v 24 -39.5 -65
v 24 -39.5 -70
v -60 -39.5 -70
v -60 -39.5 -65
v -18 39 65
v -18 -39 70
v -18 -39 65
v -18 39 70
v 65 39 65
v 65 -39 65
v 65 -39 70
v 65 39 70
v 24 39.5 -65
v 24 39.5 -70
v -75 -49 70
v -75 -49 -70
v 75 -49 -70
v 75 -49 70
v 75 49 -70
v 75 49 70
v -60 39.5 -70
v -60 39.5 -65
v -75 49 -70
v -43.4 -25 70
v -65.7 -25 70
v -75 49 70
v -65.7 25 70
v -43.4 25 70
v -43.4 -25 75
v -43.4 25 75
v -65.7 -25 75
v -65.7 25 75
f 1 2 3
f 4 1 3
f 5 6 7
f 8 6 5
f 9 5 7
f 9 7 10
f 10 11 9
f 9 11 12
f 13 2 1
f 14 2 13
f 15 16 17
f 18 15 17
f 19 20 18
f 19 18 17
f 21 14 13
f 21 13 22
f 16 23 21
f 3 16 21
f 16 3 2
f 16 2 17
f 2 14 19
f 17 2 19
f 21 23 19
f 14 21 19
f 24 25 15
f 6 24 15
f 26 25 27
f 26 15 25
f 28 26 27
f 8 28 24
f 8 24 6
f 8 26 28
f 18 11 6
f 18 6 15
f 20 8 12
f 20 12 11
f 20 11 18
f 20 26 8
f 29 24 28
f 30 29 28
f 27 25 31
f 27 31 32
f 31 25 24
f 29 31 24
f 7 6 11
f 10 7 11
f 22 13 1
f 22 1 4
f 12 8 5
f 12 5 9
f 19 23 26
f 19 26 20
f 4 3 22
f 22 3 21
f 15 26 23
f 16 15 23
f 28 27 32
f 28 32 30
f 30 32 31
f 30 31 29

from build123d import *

# Parameters (mm, degrees)
SKETCH1_W           = 150
SKETCH1_H           = 140
BOSS_EXTRUDE1_DEPTH = 49
SKETCH2_W           = 83
SKETCH2_H           = 78
CUT_EXTRUDE1_DEPTH  = 5
SKETCH3_W           = 22.3
SKETCH3_H           = 50
BOSS_EXTRUDE2_DEPTH = 5
SKETCH4_W           = 84
SKETCH4_H           = 79
CUT_EXTRUDE2_DEPTH  = 5


with BuildPart() as part:
    # Sketch1 → Boss-Extrude1 (new, symmetric)
    with BuildSketch(Plane(origin=(0, 0, 0), x_dir=(1, 0, 0), z_dir=(0, 1, 0))):
        Rectangle(SKETCH1_W, SKETCH1_H)
    extrude(amount=BOSS_EXTRUDE1_DEPTH, both=True)

    # Sketch2 → Cut-Extrude1 (cut)
    with BuildSketch(Plane.XY.offset(70)):
        with Locations((23.5, 0)):
            Rectangle(SKETCH2_W, SKETCH2_H)
    extrude(amount=-CUT_EXTRUDE1_DEPTH, mode=Mode.SUBTRACT)

    # Sketch3 → Boss-Extrude2 (add)
    with BuildSketch(Plane.XY.offset(70)):
        with Locations((-54.55, 0)):
            Rectangle(SKETCH3_W, SKETCH3_H)
    extrude(amount=BOSS_EXTRUDE2_DEPTH)

    # Sketch4 → Cut-Extrude2 (cut)
    with BuildSketch(Plane(origin=(0, 0, -70), x_dir=(-1, 0, 0), z_dir=(0, 0, -1))):
        with Locations((18, 0)):
            Rectangle(SKETCH4_W, SKETCH4_H)
    extrude(amount=-CUT_EXTRUDE2_DEPTH, mode=Mode.SUBTRACT)


solid = part.part
